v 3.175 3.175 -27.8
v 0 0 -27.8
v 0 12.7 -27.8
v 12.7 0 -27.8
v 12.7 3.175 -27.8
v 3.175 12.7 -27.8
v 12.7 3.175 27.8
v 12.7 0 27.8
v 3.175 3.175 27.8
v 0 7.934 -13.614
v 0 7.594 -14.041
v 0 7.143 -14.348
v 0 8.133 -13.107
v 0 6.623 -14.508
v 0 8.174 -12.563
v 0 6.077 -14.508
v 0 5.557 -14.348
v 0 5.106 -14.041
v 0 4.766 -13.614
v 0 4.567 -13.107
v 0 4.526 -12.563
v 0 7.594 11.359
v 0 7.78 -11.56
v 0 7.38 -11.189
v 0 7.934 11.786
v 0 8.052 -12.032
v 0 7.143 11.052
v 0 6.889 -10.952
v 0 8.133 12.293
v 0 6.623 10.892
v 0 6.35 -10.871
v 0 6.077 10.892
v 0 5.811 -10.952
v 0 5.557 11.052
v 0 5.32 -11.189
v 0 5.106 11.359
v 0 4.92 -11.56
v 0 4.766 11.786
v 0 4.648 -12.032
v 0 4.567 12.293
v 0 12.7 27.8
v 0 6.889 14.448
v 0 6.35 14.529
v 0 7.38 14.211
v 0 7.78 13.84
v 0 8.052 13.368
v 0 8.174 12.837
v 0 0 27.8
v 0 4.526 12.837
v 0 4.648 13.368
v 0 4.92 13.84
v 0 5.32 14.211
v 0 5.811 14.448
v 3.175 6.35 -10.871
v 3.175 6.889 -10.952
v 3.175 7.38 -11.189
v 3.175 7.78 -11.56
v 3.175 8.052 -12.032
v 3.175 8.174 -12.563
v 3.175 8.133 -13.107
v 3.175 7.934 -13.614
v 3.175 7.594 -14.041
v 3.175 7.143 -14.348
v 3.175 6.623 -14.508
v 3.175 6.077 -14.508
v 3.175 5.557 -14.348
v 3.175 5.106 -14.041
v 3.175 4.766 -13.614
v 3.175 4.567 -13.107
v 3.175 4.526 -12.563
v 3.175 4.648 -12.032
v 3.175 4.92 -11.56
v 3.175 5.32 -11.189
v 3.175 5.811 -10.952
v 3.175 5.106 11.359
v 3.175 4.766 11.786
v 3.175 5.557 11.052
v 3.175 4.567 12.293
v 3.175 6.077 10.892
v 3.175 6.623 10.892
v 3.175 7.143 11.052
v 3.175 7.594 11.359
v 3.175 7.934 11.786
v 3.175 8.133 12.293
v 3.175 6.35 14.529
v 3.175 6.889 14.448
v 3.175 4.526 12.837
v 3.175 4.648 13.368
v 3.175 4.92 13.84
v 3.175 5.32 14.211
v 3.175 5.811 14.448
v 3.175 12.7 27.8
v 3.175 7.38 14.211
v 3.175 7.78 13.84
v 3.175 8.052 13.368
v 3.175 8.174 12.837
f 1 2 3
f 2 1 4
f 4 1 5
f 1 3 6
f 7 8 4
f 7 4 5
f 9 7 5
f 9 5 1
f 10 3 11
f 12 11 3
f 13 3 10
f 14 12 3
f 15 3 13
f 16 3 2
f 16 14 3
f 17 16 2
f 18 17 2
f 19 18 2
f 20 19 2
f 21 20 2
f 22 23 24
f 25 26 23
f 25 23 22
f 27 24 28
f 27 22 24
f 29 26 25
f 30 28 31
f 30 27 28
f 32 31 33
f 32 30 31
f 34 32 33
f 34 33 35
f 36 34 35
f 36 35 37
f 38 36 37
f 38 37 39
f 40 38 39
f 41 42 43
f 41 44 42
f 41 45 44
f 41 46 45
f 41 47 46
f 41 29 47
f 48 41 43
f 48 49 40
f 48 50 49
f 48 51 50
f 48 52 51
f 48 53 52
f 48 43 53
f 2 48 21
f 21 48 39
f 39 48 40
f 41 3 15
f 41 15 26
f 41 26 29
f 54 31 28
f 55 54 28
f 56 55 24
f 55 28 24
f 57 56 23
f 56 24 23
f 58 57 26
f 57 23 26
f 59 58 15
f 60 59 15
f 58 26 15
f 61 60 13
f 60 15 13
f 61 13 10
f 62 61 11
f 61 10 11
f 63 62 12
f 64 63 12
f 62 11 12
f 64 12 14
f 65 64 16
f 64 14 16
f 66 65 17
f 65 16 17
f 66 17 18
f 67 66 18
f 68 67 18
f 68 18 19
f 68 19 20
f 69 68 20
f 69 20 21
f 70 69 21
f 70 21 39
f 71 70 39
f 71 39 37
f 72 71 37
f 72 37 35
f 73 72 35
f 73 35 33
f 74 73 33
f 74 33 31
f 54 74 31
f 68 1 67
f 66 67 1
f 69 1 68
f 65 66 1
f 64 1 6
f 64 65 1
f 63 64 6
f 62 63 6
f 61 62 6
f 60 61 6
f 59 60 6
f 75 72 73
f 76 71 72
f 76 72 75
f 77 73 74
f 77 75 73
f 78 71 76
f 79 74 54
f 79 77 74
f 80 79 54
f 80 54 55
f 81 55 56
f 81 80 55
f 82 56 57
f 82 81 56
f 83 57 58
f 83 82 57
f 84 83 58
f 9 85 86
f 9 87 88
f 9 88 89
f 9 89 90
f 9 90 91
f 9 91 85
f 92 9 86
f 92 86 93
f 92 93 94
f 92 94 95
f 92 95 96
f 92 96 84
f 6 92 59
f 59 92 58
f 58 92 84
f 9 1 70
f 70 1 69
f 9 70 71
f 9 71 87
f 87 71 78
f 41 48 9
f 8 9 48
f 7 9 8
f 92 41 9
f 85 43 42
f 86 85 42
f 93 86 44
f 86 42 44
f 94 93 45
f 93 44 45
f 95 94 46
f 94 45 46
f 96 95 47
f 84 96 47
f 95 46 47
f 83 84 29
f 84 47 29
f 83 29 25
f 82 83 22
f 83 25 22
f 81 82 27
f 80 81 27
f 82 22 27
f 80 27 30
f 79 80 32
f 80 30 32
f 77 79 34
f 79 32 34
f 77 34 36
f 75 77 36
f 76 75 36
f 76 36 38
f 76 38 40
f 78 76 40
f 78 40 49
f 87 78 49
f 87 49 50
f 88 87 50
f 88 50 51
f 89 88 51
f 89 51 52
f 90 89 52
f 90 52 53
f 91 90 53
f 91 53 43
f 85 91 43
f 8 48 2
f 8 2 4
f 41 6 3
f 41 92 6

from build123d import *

# Parameters (mm, degrees)
BOSS_EXTRUDE1_DEPTH = 27.800000026
SKETCH2_R           = 1.8288
CUT_EXTRUDE1_DEPTH  = 34.097129807


with BuildPart() as part:
    # Sketch1 → Boss-Extrude1 (new, symmetric)
    with BuildSketch(Plane.XY):
        Polygon((0, 12.7), (0, 0), (12.7, 0), (12.7, 3.175), (3.175, 3.175), (3.175, 12.7), align=None)
    extrude(amount=BOSS_EXTRUDE1_DEPTH, both=True)

    # Sketch2 → Cut-Extrude1 (cut, through all)
    with BuildSketch(Plane.ZY):
        with Locations((12.7, 6.35)):
            Circle(SKETCH2_R)
        with Locations((-12.7, 6.35)):
            Circle(SKETCH2_R)
    extrude(amount=-CUT_EXTRUDE1_DEPTH, mode=Mode.SUBTRACT)


solid = part.part
